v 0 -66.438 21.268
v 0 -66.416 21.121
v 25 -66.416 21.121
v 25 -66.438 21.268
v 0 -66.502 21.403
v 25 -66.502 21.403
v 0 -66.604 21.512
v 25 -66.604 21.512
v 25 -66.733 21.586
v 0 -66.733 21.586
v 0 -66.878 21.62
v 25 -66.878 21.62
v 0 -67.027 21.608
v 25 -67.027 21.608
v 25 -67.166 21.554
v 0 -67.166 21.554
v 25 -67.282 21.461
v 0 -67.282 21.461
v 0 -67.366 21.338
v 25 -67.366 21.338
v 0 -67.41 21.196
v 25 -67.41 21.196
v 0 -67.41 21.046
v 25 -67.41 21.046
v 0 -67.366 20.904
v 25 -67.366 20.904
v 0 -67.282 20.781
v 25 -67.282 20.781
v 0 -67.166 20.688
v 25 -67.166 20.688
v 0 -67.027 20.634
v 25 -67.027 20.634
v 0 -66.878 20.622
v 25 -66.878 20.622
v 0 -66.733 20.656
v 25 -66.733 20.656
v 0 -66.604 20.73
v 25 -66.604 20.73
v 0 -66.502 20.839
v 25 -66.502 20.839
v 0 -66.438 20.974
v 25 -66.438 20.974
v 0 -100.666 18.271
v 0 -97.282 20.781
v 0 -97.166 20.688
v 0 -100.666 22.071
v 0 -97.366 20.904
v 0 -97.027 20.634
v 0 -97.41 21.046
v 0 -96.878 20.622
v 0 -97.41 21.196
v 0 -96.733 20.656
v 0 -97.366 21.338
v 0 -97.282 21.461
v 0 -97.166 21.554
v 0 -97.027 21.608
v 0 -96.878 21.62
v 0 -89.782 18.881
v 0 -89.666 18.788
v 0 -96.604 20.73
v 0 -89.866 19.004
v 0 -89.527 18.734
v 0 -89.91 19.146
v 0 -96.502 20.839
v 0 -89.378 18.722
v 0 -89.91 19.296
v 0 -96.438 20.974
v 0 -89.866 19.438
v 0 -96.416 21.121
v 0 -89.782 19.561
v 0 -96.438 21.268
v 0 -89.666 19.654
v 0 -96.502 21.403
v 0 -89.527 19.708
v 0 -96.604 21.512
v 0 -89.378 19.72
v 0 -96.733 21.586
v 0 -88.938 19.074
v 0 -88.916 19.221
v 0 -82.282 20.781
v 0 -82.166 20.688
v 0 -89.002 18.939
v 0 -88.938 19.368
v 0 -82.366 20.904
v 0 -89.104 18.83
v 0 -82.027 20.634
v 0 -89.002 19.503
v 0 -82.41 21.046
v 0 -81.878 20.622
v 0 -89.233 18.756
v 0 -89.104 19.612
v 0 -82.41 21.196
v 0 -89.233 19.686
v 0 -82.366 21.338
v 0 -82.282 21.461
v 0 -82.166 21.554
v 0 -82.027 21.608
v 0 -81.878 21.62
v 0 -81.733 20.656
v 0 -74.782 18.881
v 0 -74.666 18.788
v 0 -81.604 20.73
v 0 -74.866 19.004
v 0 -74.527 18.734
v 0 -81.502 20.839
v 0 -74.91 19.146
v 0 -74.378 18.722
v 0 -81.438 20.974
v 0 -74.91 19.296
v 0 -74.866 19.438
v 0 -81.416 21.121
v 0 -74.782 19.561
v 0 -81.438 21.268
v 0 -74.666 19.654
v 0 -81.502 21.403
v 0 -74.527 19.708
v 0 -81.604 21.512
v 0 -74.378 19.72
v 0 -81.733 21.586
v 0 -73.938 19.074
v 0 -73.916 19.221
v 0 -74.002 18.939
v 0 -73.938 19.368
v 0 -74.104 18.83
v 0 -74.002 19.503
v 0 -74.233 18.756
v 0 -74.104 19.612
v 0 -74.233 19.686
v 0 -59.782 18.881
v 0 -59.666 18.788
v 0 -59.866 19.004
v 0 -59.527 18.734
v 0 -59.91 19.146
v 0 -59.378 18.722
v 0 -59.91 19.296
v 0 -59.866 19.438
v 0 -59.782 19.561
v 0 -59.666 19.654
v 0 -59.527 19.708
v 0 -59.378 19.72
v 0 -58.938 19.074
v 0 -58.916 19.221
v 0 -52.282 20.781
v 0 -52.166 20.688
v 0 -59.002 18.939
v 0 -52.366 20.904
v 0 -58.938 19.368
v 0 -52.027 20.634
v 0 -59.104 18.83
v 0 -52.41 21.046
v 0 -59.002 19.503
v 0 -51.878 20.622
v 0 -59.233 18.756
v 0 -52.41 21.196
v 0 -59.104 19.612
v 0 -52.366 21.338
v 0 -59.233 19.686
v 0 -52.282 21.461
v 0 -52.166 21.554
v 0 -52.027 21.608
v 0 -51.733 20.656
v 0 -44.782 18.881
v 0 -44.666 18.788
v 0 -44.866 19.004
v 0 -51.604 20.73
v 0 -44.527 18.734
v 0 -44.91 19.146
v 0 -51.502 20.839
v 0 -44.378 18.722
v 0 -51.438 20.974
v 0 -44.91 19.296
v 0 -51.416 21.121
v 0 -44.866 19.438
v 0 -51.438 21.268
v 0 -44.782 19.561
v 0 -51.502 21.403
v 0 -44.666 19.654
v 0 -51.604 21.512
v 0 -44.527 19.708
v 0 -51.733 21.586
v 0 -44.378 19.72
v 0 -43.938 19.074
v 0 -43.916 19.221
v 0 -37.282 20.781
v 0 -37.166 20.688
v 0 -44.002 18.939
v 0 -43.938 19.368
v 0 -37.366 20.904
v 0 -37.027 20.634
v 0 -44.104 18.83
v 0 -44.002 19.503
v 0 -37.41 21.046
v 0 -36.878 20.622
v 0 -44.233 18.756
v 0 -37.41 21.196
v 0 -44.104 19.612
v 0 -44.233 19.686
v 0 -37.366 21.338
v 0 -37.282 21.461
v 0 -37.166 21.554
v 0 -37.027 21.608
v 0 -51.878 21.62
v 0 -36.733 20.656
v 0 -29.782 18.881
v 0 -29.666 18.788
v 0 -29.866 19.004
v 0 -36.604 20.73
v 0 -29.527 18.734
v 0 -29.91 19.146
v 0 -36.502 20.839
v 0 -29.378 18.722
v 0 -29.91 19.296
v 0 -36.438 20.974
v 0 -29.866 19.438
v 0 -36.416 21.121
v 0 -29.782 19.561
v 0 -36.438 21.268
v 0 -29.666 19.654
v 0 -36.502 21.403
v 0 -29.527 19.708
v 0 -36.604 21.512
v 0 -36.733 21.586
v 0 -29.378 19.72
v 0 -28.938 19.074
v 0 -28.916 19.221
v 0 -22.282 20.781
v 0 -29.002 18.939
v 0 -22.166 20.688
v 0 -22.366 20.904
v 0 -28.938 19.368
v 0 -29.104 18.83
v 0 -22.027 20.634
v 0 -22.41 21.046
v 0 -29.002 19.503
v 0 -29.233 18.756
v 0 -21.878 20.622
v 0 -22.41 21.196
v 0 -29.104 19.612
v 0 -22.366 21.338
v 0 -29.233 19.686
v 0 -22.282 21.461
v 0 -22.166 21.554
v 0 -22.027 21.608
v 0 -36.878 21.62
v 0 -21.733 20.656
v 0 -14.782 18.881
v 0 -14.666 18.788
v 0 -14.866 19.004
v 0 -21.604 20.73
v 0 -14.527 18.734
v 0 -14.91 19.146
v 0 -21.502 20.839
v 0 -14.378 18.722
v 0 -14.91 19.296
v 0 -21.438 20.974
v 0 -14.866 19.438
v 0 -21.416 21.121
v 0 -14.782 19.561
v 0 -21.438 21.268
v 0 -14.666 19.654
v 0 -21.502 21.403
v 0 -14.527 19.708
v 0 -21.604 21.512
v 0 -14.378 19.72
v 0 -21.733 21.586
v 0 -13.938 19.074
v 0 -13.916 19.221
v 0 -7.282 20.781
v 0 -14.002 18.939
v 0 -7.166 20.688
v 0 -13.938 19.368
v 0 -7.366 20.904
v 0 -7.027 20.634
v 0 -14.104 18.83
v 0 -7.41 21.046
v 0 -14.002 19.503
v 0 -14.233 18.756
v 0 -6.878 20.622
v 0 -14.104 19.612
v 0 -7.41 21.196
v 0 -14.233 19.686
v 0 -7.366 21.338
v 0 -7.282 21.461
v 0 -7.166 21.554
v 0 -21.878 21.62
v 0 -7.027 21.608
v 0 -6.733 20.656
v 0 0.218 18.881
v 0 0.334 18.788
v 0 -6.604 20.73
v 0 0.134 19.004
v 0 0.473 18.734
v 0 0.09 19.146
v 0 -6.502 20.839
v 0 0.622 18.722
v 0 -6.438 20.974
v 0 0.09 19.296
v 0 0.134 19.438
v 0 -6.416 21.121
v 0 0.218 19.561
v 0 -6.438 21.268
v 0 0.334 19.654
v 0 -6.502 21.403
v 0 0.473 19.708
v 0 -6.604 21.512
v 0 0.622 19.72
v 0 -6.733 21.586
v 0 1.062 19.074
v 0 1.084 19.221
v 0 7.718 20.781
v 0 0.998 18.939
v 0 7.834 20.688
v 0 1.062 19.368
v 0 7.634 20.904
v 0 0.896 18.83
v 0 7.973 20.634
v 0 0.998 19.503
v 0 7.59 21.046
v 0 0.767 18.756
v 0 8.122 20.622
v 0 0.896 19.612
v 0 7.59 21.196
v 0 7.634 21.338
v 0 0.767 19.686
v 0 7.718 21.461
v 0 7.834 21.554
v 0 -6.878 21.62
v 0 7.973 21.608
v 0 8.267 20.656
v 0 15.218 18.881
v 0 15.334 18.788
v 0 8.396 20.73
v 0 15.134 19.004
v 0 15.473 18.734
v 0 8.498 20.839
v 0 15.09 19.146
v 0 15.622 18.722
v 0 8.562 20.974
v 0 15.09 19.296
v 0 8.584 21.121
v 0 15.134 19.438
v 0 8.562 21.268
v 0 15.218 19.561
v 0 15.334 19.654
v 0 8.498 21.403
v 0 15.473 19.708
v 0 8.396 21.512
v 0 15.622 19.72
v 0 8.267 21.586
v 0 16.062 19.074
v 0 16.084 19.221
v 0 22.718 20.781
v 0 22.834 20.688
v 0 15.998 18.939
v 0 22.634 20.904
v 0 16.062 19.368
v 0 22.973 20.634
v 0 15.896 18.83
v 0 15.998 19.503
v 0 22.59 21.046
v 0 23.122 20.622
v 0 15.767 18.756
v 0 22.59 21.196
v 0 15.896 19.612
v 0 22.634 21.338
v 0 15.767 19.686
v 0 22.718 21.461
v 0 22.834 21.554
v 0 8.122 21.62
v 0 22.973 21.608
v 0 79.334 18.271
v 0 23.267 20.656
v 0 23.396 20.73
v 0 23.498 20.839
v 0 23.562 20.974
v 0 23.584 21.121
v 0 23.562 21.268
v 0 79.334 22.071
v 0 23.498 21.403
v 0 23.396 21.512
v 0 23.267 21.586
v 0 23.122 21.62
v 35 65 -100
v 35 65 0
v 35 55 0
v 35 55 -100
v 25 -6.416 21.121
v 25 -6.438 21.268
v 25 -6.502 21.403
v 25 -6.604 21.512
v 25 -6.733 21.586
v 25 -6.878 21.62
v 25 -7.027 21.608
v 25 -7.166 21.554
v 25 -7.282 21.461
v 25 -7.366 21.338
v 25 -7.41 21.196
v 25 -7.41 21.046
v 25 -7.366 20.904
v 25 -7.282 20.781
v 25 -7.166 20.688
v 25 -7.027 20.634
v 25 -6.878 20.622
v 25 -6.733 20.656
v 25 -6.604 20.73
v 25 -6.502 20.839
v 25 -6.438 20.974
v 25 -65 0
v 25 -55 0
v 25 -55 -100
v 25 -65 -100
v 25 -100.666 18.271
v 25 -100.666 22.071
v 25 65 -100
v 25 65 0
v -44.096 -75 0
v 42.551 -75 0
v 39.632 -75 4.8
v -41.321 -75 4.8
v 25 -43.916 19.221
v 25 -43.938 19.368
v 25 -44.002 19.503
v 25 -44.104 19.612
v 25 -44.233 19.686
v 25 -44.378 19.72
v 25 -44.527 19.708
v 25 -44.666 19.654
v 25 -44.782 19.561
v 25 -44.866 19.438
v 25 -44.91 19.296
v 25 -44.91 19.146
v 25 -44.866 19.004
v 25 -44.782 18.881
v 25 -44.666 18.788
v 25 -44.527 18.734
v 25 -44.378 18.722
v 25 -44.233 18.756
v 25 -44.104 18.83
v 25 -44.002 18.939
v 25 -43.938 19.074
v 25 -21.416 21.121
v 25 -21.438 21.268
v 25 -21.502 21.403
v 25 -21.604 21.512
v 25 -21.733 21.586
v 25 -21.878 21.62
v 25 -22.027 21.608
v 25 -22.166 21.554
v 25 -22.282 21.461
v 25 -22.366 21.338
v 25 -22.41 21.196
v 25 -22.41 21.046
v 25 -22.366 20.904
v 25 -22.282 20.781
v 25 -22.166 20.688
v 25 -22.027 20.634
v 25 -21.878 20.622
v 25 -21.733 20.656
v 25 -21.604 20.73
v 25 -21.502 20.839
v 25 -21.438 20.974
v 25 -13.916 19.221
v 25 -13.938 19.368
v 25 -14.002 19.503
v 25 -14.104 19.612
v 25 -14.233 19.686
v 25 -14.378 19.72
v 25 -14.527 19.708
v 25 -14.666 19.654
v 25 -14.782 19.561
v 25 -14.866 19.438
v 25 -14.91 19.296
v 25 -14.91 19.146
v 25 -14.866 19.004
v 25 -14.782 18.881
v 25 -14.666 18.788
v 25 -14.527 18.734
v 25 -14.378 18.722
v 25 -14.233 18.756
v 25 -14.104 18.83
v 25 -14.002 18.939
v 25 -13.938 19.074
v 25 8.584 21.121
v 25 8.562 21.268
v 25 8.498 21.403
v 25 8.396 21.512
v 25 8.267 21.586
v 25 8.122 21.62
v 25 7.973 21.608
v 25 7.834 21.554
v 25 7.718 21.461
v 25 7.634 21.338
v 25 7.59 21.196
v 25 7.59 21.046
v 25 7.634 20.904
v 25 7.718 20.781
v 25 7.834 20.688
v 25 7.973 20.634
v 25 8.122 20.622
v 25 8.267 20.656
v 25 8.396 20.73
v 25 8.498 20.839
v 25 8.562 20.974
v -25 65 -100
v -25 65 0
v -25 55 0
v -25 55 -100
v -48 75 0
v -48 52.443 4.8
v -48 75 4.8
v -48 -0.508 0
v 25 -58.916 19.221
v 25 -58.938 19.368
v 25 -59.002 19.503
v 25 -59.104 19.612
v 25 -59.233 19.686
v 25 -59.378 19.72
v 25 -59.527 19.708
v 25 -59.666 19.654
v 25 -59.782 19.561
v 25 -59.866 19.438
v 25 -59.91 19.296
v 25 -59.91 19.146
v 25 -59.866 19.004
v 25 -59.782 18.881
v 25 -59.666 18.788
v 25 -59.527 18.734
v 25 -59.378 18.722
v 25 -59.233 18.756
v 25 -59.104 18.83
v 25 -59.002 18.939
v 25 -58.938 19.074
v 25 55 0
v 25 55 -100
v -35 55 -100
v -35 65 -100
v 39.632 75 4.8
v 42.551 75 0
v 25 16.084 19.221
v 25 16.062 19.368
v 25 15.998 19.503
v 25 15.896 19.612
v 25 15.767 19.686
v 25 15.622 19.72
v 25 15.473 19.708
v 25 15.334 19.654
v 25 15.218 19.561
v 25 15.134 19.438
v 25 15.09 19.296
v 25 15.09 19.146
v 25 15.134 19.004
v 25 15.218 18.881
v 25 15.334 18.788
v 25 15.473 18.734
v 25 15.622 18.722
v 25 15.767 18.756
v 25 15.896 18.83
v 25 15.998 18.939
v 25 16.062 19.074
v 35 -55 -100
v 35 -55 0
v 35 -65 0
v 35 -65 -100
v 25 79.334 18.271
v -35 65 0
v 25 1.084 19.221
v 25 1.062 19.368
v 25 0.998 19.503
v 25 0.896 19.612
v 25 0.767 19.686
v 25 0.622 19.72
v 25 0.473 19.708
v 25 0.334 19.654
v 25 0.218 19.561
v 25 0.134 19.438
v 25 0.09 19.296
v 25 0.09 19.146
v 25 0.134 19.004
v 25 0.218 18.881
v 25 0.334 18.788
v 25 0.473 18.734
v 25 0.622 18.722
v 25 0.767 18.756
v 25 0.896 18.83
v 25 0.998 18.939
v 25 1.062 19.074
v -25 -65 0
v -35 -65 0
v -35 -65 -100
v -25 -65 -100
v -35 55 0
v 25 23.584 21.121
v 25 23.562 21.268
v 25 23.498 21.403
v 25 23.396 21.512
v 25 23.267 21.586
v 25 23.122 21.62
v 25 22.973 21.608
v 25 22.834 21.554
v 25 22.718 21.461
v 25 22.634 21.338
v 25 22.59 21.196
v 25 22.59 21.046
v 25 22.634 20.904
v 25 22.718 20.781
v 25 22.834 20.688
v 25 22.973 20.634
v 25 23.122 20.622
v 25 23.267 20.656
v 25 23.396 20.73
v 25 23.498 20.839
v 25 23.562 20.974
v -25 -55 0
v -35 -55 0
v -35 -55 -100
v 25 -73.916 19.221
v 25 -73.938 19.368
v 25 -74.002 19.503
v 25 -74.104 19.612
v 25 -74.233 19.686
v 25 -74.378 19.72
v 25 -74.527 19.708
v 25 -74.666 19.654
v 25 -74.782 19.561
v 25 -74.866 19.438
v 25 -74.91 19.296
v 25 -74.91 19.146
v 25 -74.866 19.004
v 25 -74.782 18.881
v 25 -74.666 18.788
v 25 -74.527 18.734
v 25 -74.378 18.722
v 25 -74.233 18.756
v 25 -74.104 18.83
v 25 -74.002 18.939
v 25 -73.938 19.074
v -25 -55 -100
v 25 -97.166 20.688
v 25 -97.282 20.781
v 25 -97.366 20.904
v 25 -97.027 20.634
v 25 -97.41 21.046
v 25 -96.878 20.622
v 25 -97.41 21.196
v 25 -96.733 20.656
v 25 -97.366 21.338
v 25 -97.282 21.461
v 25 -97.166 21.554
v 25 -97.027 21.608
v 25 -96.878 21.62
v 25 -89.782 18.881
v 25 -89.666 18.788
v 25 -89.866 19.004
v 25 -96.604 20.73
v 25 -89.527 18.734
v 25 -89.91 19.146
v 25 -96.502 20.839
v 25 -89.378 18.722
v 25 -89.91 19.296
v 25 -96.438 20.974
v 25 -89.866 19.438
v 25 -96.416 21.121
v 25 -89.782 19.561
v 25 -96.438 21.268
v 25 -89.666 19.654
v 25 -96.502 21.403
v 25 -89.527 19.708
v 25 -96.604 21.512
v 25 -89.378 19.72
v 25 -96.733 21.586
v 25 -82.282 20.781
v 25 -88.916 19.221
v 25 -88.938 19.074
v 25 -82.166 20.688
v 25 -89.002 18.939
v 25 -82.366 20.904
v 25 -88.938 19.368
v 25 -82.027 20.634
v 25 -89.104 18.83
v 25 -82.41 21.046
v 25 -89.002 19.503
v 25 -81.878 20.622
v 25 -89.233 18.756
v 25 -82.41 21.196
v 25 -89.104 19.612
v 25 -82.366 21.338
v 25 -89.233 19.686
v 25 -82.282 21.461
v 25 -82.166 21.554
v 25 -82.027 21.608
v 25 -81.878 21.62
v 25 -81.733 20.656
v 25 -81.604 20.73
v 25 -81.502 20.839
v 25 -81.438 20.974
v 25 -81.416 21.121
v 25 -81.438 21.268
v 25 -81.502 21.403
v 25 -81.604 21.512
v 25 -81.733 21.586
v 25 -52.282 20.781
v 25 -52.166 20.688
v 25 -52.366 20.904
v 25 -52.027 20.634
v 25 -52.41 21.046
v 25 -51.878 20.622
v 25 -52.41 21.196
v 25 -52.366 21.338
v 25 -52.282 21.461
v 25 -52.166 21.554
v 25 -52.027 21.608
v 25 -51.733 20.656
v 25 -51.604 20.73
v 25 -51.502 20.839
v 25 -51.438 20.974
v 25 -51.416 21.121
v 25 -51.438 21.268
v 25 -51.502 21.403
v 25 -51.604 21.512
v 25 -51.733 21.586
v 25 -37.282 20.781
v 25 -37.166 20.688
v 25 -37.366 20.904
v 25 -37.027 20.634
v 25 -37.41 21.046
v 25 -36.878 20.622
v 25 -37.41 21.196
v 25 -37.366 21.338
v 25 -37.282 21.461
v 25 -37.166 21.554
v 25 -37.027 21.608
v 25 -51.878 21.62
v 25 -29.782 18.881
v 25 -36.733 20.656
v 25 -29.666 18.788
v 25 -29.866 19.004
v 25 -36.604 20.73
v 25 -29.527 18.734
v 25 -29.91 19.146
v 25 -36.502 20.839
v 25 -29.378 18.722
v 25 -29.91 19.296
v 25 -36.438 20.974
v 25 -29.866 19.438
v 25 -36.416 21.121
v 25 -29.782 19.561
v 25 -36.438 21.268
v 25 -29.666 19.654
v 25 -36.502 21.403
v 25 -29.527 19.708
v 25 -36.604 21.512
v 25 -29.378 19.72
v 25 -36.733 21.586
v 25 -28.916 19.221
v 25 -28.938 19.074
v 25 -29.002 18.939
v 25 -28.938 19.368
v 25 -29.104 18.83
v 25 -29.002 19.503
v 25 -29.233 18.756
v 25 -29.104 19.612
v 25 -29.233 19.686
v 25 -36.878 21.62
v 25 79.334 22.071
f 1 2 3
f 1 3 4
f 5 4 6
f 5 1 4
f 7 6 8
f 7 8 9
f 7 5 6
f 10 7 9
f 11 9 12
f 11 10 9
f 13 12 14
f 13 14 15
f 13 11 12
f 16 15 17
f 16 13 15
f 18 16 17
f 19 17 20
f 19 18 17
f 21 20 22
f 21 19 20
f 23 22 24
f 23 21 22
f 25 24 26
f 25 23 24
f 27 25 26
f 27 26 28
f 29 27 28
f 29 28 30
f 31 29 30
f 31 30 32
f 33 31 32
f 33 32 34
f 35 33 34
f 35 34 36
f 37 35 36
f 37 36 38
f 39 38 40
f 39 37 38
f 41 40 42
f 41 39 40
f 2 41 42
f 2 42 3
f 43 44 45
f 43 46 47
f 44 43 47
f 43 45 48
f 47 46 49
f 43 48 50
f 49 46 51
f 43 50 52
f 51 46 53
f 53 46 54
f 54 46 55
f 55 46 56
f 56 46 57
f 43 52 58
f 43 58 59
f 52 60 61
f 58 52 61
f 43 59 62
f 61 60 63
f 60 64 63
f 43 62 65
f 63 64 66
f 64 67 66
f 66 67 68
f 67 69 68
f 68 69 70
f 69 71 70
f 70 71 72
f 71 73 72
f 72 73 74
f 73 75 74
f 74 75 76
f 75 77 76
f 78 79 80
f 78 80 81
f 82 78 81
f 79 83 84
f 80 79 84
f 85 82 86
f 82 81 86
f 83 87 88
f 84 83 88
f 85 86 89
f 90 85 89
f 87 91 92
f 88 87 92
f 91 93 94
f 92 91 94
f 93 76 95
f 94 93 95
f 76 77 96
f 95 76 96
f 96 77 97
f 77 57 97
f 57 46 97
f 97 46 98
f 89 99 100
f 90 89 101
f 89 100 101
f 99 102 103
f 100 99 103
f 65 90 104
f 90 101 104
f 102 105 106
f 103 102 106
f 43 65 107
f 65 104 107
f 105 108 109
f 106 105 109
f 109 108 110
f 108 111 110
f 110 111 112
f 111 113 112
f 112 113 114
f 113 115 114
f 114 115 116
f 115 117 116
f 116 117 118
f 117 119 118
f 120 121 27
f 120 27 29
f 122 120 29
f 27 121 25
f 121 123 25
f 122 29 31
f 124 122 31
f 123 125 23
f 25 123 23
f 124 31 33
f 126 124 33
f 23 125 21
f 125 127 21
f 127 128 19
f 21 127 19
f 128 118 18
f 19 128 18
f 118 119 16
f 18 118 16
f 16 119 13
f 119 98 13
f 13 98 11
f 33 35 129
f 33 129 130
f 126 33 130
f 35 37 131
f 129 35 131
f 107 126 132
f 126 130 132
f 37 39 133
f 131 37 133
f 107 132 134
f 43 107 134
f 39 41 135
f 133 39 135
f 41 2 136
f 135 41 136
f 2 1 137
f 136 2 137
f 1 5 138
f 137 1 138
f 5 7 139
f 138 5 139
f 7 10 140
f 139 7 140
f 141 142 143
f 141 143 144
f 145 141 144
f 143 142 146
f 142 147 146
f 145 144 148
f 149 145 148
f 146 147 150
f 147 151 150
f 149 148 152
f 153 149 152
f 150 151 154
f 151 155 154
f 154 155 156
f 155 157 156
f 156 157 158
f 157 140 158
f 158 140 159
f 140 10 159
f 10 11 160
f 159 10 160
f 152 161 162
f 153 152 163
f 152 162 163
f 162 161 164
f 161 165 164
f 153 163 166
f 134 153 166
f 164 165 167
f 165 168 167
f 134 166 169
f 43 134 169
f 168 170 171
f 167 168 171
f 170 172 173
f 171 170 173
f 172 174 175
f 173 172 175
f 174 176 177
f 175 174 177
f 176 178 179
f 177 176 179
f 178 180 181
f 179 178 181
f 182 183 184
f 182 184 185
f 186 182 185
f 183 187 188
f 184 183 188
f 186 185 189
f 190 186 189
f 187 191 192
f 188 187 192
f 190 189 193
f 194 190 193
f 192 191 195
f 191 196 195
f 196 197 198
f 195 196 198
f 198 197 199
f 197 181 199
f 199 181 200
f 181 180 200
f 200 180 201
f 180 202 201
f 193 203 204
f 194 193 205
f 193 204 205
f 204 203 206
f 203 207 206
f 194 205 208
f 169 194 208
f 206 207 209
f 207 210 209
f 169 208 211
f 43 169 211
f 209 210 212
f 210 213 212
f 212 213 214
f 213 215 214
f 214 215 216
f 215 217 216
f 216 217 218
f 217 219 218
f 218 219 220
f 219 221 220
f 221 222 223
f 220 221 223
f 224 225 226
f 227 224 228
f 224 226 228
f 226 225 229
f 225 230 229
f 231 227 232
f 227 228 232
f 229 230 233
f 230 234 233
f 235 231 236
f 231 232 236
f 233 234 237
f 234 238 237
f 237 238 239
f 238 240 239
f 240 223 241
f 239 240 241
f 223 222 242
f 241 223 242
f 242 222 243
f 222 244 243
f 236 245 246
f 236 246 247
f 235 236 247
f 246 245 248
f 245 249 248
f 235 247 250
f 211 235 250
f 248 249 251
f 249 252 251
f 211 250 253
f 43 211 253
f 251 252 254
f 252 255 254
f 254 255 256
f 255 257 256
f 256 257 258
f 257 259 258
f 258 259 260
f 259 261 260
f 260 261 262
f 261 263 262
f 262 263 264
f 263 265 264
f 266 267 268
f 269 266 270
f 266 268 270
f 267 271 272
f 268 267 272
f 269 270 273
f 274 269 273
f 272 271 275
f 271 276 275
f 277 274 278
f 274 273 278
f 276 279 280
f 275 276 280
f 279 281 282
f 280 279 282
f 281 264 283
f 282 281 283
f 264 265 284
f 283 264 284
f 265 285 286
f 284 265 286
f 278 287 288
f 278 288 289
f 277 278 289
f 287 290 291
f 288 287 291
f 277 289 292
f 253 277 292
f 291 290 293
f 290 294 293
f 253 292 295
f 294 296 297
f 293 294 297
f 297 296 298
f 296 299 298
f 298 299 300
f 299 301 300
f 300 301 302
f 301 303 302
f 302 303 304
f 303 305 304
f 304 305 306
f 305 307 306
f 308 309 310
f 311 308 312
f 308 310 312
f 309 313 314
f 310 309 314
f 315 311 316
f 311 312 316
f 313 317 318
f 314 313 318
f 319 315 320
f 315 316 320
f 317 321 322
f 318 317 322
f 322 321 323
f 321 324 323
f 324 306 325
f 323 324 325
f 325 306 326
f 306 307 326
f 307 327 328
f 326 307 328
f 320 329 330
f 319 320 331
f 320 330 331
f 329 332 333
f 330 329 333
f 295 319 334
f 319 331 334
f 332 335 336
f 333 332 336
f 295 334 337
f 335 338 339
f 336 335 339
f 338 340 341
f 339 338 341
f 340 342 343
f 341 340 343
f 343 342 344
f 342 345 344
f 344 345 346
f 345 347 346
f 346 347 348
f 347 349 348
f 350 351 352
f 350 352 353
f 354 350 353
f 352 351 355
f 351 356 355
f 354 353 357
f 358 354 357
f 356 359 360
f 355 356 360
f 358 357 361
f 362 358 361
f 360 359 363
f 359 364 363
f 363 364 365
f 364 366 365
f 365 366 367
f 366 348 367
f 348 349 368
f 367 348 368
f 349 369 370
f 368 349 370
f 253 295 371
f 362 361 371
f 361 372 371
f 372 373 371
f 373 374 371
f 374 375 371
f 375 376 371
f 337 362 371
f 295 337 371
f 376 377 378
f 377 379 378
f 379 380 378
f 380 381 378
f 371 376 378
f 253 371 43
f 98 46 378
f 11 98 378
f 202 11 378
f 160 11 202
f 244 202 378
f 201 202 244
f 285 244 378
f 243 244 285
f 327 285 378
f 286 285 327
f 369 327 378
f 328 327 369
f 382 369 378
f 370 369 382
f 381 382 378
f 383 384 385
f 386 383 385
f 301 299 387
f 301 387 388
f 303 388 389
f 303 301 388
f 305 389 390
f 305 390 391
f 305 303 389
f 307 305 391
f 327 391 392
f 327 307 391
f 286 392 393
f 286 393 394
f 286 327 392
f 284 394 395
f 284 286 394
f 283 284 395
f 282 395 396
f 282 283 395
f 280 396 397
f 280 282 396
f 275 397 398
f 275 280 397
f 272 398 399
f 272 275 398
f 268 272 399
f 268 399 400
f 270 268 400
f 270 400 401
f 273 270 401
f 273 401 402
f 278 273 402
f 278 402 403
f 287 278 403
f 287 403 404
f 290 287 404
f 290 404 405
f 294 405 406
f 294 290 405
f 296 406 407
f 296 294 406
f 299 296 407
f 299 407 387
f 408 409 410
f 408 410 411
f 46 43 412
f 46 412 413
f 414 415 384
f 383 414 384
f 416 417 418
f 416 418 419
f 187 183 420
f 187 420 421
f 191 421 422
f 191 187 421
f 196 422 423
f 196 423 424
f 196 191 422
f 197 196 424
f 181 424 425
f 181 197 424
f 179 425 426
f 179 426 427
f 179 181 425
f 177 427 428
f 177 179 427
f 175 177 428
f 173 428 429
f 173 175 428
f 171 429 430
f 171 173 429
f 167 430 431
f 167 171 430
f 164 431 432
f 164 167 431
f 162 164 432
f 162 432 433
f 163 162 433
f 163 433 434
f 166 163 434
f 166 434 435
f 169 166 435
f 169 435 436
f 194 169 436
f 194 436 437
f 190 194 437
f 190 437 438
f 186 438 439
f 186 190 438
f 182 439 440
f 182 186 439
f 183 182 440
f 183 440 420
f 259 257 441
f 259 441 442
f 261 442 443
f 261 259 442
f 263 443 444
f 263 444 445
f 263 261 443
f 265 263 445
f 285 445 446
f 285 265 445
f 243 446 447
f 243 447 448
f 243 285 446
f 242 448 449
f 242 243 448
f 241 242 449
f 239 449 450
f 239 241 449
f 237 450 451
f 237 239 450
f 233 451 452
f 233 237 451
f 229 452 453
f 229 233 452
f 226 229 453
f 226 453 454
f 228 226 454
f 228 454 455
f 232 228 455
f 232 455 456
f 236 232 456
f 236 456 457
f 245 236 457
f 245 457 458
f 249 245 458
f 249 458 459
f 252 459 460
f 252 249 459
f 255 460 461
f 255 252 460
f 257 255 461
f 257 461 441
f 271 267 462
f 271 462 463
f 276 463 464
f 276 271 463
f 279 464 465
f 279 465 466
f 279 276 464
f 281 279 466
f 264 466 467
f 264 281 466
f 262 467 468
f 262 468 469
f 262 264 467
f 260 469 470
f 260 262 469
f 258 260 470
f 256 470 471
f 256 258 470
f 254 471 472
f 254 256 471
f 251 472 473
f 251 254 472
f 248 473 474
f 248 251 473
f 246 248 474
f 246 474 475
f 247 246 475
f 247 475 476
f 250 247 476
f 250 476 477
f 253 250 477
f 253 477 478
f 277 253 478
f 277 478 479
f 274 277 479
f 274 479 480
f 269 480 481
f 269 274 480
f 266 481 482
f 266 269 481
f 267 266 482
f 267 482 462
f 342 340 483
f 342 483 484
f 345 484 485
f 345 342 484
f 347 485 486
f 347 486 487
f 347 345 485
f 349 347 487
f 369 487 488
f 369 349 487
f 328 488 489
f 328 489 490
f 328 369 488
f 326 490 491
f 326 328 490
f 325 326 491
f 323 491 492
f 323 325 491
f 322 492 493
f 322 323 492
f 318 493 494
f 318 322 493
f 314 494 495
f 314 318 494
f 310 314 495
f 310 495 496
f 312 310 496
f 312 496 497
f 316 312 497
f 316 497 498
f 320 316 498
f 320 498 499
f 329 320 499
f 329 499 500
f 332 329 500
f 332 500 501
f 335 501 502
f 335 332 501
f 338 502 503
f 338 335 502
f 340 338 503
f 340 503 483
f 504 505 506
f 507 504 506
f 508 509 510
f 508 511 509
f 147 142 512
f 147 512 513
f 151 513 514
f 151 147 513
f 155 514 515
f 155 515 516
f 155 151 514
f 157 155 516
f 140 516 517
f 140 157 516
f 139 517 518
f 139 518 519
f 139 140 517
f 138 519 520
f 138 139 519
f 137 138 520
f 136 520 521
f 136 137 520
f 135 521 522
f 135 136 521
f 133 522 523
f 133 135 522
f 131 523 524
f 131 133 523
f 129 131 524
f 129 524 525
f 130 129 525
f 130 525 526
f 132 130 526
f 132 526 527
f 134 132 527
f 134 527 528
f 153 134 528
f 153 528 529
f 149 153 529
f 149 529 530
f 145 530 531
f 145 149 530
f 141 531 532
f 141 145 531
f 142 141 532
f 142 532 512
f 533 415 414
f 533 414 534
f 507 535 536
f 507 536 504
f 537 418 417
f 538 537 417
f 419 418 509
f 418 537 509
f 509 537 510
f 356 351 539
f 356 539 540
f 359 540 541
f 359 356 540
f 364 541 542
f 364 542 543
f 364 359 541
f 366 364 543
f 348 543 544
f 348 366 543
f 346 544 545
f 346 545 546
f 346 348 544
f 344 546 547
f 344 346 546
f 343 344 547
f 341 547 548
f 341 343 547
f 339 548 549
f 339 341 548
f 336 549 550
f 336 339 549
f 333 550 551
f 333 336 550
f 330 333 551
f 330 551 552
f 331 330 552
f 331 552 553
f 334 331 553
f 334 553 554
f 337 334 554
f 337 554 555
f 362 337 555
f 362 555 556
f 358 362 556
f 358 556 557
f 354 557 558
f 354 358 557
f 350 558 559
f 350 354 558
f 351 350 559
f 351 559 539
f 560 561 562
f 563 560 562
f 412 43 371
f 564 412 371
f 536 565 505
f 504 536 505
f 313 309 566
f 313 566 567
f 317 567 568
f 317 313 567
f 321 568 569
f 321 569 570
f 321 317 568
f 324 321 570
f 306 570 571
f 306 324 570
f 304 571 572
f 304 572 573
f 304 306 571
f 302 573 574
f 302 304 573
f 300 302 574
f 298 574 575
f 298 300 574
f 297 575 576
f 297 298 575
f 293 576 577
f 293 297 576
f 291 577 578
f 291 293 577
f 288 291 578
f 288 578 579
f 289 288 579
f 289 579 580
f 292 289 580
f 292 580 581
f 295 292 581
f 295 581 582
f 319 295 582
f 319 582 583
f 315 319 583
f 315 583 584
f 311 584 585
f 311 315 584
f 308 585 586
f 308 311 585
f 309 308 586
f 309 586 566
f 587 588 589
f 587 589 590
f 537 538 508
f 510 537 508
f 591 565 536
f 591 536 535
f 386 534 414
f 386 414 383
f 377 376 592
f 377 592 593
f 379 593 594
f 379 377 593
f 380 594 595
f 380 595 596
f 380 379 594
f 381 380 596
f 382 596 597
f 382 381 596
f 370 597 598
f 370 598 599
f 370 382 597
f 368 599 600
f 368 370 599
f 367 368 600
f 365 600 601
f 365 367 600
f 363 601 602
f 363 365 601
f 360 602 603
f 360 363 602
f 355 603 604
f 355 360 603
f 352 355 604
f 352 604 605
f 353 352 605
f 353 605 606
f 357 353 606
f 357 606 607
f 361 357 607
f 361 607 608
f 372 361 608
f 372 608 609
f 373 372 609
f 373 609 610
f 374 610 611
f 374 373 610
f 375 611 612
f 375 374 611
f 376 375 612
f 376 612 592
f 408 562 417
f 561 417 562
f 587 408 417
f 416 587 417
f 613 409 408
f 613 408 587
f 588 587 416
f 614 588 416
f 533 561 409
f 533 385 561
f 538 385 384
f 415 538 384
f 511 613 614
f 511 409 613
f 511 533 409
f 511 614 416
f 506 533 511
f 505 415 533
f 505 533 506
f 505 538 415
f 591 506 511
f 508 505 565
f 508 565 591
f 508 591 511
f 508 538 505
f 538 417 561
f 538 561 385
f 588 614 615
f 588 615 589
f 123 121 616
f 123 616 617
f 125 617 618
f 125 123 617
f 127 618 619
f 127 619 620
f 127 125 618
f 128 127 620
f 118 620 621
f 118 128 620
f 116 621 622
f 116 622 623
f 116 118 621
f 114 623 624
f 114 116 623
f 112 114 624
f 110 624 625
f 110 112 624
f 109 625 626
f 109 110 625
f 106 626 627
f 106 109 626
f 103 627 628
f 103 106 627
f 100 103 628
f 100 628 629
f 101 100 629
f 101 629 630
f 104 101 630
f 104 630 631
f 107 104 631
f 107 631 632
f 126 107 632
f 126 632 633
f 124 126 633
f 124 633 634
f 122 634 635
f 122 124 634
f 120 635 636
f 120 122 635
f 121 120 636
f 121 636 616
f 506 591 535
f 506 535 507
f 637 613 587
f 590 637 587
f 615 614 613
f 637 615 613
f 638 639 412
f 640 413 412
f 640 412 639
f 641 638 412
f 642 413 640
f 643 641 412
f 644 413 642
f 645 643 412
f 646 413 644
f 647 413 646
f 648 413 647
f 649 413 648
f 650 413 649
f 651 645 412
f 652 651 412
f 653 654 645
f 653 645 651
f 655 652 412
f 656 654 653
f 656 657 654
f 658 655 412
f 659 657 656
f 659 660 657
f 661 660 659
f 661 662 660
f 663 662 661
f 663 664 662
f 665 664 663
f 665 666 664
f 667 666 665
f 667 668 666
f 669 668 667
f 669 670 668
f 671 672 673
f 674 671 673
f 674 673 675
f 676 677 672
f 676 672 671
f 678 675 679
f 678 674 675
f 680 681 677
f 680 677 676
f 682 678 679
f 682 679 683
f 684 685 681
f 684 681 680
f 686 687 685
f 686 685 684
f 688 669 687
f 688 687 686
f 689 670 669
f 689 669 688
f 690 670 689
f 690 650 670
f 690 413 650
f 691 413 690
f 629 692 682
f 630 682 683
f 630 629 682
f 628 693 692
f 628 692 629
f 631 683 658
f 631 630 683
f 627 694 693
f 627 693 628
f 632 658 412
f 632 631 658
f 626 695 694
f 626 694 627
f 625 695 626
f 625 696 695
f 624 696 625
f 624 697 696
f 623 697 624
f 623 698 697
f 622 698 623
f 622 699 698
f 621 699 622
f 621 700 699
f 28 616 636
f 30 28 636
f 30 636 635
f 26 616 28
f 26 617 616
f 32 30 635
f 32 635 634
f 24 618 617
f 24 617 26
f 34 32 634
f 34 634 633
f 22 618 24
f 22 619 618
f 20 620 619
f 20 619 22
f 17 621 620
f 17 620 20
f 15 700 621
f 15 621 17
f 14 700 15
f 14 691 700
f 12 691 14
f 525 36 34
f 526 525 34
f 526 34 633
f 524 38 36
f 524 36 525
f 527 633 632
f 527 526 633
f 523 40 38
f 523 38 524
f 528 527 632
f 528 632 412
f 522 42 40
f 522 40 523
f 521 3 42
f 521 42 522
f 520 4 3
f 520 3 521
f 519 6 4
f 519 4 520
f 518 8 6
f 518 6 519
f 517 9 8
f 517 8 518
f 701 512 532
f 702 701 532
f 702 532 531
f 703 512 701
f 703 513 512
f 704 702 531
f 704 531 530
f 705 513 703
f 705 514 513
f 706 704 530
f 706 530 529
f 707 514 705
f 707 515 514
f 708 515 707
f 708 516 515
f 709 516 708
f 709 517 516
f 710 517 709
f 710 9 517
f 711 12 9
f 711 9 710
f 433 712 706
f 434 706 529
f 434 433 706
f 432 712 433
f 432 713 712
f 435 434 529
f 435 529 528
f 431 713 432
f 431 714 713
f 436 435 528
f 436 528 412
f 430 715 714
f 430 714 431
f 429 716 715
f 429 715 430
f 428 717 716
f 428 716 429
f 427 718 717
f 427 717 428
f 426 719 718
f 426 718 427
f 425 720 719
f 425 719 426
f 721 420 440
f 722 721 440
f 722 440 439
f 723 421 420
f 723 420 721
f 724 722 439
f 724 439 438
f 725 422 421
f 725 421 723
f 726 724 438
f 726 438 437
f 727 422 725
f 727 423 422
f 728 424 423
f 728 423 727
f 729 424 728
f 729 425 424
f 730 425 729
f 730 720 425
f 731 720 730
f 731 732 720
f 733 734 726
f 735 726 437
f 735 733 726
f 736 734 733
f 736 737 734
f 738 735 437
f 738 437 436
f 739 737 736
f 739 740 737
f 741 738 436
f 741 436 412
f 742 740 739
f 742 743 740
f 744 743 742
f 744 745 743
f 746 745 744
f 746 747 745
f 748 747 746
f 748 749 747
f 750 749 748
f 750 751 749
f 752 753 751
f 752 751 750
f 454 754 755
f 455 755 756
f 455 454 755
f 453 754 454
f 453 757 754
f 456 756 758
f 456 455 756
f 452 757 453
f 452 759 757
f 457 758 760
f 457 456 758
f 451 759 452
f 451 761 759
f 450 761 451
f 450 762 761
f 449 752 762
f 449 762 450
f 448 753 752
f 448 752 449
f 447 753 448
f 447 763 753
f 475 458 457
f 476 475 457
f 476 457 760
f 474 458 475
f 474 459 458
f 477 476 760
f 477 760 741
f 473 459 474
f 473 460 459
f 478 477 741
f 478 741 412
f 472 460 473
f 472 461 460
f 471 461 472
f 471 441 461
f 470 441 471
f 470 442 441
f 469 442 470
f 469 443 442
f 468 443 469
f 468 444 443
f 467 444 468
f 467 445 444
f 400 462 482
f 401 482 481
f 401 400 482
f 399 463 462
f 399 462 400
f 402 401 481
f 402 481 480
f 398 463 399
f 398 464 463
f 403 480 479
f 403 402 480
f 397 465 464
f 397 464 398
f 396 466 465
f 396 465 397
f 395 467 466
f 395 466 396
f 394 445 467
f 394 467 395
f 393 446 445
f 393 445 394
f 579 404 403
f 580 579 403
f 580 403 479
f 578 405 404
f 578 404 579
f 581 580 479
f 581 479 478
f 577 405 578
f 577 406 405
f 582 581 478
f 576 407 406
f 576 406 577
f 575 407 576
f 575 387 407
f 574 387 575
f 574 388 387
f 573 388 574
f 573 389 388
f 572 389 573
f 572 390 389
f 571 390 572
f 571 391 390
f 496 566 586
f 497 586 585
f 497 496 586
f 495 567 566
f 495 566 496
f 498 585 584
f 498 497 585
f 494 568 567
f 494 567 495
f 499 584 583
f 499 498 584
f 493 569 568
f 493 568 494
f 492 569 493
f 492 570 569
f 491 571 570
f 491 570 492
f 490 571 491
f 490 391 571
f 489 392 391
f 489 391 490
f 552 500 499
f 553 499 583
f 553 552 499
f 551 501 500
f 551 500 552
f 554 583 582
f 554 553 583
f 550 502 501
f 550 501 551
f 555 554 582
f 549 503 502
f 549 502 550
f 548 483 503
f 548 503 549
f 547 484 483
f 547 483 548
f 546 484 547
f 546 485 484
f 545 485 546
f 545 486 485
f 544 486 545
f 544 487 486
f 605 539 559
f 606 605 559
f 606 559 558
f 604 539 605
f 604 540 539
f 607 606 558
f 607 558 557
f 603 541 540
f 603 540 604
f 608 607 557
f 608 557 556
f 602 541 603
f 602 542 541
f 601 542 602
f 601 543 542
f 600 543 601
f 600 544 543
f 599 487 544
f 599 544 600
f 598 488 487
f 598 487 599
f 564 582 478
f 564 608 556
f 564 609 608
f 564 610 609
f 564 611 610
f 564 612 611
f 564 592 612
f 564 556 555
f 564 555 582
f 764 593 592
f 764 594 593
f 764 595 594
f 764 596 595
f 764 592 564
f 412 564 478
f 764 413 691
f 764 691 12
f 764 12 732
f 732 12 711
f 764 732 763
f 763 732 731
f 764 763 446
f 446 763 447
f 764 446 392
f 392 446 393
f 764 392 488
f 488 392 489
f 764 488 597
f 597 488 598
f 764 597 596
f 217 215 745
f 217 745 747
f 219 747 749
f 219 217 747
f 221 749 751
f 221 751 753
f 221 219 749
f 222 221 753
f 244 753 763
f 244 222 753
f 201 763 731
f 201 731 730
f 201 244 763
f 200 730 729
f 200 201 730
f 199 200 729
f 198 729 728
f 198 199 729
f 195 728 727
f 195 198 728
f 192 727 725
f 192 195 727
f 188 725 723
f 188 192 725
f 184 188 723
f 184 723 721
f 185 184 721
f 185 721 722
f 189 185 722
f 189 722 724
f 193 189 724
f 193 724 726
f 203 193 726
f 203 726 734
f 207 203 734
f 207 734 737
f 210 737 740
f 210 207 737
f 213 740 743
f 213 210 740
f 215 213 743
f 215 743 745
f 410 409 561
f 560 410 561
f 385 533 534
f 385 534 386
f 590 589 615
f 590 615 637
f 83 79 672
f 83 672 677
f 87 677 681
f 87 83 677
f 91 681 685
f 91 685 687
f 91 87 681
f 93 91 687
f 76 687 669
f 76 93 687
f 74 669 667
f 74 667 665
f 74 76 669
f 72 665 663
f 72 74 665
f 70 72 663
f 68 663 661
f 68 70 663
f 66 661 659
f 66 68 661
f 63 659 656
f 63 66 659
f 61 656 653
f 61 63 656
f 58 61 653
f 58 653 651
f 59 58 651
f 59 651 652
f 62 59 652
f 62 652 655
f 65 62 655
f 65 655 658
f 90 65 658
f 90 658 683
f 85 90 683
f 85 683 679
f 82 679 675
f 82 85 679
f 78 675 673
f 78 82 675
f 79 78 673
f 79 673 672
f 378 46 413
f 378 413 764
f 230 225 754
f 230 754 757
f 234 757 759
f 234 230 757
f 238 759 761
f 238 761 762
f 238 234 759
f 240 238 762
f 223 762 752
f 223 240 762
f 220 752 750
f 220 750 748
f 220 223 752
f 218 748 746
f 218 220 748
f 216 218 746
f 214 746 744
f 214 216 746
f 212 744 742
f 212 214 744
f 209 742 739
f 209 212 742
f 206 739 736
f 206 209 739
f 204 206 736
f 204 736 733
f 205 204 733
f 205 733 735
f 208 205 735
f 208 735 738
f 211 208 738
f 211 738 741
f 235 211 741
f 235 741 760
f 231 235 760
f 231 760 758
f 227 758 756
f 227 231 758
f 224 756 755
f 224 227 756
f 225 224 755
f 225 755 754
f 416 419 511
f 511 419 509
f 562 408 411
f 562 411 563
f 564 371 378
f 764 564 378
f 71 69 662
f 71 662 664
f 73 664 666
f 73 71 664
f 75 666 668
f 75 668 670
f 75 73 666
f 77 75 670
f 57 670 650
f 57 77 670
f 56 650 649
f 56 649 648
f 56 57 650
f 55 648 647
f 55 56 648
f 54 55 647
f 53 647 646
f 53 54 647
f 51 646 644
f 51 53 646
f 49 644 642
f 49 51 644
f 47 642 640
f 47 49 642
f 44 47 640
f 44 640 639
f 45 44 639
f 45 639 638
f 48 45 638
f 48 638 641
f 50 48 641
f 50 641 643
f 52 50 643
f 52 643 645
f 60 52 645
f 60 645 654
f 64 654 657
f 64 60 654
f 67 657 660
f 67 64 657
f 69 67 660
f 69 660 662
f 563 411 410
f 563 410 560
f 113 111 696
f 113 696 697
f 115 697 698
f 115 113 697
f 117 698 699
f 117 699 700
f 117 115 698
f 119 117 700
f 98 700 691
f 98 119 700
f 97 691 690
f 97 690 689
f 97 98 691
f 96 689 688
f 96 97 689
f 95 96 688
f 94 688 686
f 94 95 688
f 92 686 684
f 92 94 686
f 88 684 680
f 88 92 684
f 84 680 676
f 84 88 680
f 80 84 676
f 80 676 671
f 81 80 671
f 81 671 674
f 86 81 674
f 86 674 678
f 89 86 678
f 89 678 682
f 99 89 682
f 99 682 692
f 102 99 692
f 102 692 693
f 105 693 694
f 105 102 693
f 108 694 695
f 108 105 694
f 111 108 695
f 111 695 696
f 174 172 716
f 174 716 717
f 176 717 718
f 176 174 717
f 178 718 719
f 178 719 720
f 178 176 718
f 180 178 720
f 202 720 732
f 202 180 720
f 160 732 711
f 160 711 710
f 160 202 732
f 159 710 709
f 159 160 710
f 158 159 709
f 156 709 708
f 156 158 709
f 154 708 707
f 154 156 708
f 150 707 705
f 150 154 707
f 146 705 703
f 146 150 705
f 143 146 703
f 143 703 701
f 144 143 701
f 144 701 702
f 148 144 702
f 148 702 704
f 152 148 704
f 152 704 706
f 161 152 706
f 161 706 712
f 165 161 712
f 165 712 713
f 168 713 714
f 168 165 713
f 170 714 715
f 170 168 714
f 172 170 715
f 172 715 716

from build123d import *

# Parameters (mm, degrees)
F0_W      = 48
F0_H      = 150
F1_DEPTH  = 4.8
F5_DEPTH  = 68.9631378847
F6_DEPTH  = 83.3454182282
F8_W      = 10
F8_H      = 10
F9_DEPTH  = 100
F11_DEPTH = 150.001
F12_W     = 180
F12_H     = 3.8
F12_R     = 0.5
F13_DEPTH = 25


with BuildPart() as f1:
    # F0 (on Top) → F1 (new body)
    with BuildSketch(Plane.XY):
        with Locations((24, 0)):
            Rectangle(F0_W, F0_H)
    extrude(amount=F1_DEPTH)

    # F4 (on line) → F5 (cut, through all)
    with BuildSketch(Plane(origin=(0.4420924529, 8.4356265233, 0), x_dir=(0.9986295348, -0.0523359562, 0), z_dir=(-0.0523359562, -0.9986295348, 0))):
        Polygon((61.4937136564, 17.132105228), (40.0873841201, 13.6371948011), (53.9153187719, -10.3134905796), (66.7064852408, -14.0210765163), align=None)
    extrude(amount=-F5_DEPTH, mode=Mode.SUBTRACT)

    # F4 (on line) → F6 (cut, through all)
    with BuildSketch(Plane(origin=(0.4420924529, 8.4356265233, 0), x_dir=(0.9986295348, -0.0523359562, 0), z_dir=(-0.0523359562, -0.9986295348, 0))):
        Polygon((61.4937136564, 17.132105228), (40.0873841201, 13.6371948011), (53.9153187719, -10.3134905796), (66.7064852408, -14.0210765163), align=None)
    extrude(amount=F6_DEPTH, mode=Mode.SUBTRACT)

    # F7: F1 across plane


with BuildPart() as f1_1:
    add(f1.part)
    add(f1.part.mirror(Plane.YZ))

    # F8 (on face) → F9 (join)
    with BuildSketch(Plane(origin=(0, 0, 0), x_dir=(1, 0, 0), z_dir=(0, 0, -1))):
        with Locations((-30, 60)):
            Rectangle(F8_W, F8_H)
        with Locations((30, 60)):
            Rectangle(F8_W, F8_H)
        with Locations((30, -60)):
            Rectangle(F8_W, F8_H)
        with Locations((-30, -60)):
            Rectangle(F8_W, F8_H)
    extrude(amount=F9_DEPTH)

    # F10 (on face) → F11 (cut, through all)
    with BuildSketch(Plane.XZ.offset(75)):
        Polygon((34.8348915577, 12.6849524677), (48.7158372998, -10.1333111525), (49.0075275302, -3.8525555283), (49.0075275302, -10.8070056885), (48.9463172853, -9.7643891349), (48.3853444457, -11.9521543384), (50.2030849457, -10.4640051723), (51.5250787139, -8.9758560061), (52.516579628, -10.2986544371), (50.2030849457, 21.1177915335), (36.6526320577, 31.4541943371), align=None)
    extrude(amount=-F11_DEPTH, mode=Mode.SUBTRACT)


with BuildPart() as f13:
    # F12 (on Right) → F13 (new body)
    with BuildSketch(Plane.YZ):
        with Locations((-10.6655588388, 20.1710040491)):
            Rectangle(F12_W, F12_H)
        with Locations((-89.4155588388, 19.2210040491)):
            Circle(F12_R, mode=Mode.SUBTRACT)
        with Locations((-74.4155588388, 19.2210040491)):
            Circle(F12_R, mode=Mode.SUBTRACT)
        with Locations((-59.4155588388, 19.2210040491)):
            Circle(F12_R, mode=Mode.SUBTRACT)
        with Locations((-44.4155588388, 19.2210040491)):
            Circle(F12_R, mode=Mode.SUBTRACT)
        with Locations((-29.4155588388, 19.2210040491)):
            Circle(F12_R, mode=Mode.SUBTRACT)
        with Locations((-14.4155588388, 19.2210040491)):
            Circle(F12_R, mode=Mode.SUBTRACT)
        with Locations((0.5844411612, 19.2210040491)):
            Circle(F12_R, mode=Mode.SUBTRACT)
        with Locations((15.5844411612, 19.2210040491)):
            Circle(F12_R, mode=Mode.SUBTRACT)
        with Locations((-96.9155588388, 21.1210040491)):
            Circle(F12_R, mode=Mode.SUBTRACT)
        with Locations((-81.9155588388, 21.1210040491)):
            Circle(F12_R, mode=Mode.SUBTRACT)
        with Locations((-66.9155588388, 21.1210040491)):
            Circle(F12_R, mode=Mode.SUBTRACT)
        with Locations((-51.9155588388, 21.1210040491)):
            Circle(F12_R, mode=Mode.SUBTRACT)
        with Locations((-36.9155588388, 21.1210040491)):
            Circle(F12_R, mode=Mode.SUBTRACT)
        with Locations((-21.9155588388, 21.1210040491)):
            Circle(F12_R, mode=Mode.SUBTRACT)
        with Locations((-6.9155588388, 21.1210040491)):
            Circle(F12_R, mode=Mode.SUBTRACT)
        with Locations((8.0844411612, 21.1210040491)):
            Circle(F12_R, mode=Mode.SUBTRACT)
        with Locations((23.0844411612, 21.1210040491)):
            Circle(F12_R, mode=Mode.SUBTRACT)
    extrude(amount=F13_DEPTH)


solid = Compound([f1_1.part, f13.part])
